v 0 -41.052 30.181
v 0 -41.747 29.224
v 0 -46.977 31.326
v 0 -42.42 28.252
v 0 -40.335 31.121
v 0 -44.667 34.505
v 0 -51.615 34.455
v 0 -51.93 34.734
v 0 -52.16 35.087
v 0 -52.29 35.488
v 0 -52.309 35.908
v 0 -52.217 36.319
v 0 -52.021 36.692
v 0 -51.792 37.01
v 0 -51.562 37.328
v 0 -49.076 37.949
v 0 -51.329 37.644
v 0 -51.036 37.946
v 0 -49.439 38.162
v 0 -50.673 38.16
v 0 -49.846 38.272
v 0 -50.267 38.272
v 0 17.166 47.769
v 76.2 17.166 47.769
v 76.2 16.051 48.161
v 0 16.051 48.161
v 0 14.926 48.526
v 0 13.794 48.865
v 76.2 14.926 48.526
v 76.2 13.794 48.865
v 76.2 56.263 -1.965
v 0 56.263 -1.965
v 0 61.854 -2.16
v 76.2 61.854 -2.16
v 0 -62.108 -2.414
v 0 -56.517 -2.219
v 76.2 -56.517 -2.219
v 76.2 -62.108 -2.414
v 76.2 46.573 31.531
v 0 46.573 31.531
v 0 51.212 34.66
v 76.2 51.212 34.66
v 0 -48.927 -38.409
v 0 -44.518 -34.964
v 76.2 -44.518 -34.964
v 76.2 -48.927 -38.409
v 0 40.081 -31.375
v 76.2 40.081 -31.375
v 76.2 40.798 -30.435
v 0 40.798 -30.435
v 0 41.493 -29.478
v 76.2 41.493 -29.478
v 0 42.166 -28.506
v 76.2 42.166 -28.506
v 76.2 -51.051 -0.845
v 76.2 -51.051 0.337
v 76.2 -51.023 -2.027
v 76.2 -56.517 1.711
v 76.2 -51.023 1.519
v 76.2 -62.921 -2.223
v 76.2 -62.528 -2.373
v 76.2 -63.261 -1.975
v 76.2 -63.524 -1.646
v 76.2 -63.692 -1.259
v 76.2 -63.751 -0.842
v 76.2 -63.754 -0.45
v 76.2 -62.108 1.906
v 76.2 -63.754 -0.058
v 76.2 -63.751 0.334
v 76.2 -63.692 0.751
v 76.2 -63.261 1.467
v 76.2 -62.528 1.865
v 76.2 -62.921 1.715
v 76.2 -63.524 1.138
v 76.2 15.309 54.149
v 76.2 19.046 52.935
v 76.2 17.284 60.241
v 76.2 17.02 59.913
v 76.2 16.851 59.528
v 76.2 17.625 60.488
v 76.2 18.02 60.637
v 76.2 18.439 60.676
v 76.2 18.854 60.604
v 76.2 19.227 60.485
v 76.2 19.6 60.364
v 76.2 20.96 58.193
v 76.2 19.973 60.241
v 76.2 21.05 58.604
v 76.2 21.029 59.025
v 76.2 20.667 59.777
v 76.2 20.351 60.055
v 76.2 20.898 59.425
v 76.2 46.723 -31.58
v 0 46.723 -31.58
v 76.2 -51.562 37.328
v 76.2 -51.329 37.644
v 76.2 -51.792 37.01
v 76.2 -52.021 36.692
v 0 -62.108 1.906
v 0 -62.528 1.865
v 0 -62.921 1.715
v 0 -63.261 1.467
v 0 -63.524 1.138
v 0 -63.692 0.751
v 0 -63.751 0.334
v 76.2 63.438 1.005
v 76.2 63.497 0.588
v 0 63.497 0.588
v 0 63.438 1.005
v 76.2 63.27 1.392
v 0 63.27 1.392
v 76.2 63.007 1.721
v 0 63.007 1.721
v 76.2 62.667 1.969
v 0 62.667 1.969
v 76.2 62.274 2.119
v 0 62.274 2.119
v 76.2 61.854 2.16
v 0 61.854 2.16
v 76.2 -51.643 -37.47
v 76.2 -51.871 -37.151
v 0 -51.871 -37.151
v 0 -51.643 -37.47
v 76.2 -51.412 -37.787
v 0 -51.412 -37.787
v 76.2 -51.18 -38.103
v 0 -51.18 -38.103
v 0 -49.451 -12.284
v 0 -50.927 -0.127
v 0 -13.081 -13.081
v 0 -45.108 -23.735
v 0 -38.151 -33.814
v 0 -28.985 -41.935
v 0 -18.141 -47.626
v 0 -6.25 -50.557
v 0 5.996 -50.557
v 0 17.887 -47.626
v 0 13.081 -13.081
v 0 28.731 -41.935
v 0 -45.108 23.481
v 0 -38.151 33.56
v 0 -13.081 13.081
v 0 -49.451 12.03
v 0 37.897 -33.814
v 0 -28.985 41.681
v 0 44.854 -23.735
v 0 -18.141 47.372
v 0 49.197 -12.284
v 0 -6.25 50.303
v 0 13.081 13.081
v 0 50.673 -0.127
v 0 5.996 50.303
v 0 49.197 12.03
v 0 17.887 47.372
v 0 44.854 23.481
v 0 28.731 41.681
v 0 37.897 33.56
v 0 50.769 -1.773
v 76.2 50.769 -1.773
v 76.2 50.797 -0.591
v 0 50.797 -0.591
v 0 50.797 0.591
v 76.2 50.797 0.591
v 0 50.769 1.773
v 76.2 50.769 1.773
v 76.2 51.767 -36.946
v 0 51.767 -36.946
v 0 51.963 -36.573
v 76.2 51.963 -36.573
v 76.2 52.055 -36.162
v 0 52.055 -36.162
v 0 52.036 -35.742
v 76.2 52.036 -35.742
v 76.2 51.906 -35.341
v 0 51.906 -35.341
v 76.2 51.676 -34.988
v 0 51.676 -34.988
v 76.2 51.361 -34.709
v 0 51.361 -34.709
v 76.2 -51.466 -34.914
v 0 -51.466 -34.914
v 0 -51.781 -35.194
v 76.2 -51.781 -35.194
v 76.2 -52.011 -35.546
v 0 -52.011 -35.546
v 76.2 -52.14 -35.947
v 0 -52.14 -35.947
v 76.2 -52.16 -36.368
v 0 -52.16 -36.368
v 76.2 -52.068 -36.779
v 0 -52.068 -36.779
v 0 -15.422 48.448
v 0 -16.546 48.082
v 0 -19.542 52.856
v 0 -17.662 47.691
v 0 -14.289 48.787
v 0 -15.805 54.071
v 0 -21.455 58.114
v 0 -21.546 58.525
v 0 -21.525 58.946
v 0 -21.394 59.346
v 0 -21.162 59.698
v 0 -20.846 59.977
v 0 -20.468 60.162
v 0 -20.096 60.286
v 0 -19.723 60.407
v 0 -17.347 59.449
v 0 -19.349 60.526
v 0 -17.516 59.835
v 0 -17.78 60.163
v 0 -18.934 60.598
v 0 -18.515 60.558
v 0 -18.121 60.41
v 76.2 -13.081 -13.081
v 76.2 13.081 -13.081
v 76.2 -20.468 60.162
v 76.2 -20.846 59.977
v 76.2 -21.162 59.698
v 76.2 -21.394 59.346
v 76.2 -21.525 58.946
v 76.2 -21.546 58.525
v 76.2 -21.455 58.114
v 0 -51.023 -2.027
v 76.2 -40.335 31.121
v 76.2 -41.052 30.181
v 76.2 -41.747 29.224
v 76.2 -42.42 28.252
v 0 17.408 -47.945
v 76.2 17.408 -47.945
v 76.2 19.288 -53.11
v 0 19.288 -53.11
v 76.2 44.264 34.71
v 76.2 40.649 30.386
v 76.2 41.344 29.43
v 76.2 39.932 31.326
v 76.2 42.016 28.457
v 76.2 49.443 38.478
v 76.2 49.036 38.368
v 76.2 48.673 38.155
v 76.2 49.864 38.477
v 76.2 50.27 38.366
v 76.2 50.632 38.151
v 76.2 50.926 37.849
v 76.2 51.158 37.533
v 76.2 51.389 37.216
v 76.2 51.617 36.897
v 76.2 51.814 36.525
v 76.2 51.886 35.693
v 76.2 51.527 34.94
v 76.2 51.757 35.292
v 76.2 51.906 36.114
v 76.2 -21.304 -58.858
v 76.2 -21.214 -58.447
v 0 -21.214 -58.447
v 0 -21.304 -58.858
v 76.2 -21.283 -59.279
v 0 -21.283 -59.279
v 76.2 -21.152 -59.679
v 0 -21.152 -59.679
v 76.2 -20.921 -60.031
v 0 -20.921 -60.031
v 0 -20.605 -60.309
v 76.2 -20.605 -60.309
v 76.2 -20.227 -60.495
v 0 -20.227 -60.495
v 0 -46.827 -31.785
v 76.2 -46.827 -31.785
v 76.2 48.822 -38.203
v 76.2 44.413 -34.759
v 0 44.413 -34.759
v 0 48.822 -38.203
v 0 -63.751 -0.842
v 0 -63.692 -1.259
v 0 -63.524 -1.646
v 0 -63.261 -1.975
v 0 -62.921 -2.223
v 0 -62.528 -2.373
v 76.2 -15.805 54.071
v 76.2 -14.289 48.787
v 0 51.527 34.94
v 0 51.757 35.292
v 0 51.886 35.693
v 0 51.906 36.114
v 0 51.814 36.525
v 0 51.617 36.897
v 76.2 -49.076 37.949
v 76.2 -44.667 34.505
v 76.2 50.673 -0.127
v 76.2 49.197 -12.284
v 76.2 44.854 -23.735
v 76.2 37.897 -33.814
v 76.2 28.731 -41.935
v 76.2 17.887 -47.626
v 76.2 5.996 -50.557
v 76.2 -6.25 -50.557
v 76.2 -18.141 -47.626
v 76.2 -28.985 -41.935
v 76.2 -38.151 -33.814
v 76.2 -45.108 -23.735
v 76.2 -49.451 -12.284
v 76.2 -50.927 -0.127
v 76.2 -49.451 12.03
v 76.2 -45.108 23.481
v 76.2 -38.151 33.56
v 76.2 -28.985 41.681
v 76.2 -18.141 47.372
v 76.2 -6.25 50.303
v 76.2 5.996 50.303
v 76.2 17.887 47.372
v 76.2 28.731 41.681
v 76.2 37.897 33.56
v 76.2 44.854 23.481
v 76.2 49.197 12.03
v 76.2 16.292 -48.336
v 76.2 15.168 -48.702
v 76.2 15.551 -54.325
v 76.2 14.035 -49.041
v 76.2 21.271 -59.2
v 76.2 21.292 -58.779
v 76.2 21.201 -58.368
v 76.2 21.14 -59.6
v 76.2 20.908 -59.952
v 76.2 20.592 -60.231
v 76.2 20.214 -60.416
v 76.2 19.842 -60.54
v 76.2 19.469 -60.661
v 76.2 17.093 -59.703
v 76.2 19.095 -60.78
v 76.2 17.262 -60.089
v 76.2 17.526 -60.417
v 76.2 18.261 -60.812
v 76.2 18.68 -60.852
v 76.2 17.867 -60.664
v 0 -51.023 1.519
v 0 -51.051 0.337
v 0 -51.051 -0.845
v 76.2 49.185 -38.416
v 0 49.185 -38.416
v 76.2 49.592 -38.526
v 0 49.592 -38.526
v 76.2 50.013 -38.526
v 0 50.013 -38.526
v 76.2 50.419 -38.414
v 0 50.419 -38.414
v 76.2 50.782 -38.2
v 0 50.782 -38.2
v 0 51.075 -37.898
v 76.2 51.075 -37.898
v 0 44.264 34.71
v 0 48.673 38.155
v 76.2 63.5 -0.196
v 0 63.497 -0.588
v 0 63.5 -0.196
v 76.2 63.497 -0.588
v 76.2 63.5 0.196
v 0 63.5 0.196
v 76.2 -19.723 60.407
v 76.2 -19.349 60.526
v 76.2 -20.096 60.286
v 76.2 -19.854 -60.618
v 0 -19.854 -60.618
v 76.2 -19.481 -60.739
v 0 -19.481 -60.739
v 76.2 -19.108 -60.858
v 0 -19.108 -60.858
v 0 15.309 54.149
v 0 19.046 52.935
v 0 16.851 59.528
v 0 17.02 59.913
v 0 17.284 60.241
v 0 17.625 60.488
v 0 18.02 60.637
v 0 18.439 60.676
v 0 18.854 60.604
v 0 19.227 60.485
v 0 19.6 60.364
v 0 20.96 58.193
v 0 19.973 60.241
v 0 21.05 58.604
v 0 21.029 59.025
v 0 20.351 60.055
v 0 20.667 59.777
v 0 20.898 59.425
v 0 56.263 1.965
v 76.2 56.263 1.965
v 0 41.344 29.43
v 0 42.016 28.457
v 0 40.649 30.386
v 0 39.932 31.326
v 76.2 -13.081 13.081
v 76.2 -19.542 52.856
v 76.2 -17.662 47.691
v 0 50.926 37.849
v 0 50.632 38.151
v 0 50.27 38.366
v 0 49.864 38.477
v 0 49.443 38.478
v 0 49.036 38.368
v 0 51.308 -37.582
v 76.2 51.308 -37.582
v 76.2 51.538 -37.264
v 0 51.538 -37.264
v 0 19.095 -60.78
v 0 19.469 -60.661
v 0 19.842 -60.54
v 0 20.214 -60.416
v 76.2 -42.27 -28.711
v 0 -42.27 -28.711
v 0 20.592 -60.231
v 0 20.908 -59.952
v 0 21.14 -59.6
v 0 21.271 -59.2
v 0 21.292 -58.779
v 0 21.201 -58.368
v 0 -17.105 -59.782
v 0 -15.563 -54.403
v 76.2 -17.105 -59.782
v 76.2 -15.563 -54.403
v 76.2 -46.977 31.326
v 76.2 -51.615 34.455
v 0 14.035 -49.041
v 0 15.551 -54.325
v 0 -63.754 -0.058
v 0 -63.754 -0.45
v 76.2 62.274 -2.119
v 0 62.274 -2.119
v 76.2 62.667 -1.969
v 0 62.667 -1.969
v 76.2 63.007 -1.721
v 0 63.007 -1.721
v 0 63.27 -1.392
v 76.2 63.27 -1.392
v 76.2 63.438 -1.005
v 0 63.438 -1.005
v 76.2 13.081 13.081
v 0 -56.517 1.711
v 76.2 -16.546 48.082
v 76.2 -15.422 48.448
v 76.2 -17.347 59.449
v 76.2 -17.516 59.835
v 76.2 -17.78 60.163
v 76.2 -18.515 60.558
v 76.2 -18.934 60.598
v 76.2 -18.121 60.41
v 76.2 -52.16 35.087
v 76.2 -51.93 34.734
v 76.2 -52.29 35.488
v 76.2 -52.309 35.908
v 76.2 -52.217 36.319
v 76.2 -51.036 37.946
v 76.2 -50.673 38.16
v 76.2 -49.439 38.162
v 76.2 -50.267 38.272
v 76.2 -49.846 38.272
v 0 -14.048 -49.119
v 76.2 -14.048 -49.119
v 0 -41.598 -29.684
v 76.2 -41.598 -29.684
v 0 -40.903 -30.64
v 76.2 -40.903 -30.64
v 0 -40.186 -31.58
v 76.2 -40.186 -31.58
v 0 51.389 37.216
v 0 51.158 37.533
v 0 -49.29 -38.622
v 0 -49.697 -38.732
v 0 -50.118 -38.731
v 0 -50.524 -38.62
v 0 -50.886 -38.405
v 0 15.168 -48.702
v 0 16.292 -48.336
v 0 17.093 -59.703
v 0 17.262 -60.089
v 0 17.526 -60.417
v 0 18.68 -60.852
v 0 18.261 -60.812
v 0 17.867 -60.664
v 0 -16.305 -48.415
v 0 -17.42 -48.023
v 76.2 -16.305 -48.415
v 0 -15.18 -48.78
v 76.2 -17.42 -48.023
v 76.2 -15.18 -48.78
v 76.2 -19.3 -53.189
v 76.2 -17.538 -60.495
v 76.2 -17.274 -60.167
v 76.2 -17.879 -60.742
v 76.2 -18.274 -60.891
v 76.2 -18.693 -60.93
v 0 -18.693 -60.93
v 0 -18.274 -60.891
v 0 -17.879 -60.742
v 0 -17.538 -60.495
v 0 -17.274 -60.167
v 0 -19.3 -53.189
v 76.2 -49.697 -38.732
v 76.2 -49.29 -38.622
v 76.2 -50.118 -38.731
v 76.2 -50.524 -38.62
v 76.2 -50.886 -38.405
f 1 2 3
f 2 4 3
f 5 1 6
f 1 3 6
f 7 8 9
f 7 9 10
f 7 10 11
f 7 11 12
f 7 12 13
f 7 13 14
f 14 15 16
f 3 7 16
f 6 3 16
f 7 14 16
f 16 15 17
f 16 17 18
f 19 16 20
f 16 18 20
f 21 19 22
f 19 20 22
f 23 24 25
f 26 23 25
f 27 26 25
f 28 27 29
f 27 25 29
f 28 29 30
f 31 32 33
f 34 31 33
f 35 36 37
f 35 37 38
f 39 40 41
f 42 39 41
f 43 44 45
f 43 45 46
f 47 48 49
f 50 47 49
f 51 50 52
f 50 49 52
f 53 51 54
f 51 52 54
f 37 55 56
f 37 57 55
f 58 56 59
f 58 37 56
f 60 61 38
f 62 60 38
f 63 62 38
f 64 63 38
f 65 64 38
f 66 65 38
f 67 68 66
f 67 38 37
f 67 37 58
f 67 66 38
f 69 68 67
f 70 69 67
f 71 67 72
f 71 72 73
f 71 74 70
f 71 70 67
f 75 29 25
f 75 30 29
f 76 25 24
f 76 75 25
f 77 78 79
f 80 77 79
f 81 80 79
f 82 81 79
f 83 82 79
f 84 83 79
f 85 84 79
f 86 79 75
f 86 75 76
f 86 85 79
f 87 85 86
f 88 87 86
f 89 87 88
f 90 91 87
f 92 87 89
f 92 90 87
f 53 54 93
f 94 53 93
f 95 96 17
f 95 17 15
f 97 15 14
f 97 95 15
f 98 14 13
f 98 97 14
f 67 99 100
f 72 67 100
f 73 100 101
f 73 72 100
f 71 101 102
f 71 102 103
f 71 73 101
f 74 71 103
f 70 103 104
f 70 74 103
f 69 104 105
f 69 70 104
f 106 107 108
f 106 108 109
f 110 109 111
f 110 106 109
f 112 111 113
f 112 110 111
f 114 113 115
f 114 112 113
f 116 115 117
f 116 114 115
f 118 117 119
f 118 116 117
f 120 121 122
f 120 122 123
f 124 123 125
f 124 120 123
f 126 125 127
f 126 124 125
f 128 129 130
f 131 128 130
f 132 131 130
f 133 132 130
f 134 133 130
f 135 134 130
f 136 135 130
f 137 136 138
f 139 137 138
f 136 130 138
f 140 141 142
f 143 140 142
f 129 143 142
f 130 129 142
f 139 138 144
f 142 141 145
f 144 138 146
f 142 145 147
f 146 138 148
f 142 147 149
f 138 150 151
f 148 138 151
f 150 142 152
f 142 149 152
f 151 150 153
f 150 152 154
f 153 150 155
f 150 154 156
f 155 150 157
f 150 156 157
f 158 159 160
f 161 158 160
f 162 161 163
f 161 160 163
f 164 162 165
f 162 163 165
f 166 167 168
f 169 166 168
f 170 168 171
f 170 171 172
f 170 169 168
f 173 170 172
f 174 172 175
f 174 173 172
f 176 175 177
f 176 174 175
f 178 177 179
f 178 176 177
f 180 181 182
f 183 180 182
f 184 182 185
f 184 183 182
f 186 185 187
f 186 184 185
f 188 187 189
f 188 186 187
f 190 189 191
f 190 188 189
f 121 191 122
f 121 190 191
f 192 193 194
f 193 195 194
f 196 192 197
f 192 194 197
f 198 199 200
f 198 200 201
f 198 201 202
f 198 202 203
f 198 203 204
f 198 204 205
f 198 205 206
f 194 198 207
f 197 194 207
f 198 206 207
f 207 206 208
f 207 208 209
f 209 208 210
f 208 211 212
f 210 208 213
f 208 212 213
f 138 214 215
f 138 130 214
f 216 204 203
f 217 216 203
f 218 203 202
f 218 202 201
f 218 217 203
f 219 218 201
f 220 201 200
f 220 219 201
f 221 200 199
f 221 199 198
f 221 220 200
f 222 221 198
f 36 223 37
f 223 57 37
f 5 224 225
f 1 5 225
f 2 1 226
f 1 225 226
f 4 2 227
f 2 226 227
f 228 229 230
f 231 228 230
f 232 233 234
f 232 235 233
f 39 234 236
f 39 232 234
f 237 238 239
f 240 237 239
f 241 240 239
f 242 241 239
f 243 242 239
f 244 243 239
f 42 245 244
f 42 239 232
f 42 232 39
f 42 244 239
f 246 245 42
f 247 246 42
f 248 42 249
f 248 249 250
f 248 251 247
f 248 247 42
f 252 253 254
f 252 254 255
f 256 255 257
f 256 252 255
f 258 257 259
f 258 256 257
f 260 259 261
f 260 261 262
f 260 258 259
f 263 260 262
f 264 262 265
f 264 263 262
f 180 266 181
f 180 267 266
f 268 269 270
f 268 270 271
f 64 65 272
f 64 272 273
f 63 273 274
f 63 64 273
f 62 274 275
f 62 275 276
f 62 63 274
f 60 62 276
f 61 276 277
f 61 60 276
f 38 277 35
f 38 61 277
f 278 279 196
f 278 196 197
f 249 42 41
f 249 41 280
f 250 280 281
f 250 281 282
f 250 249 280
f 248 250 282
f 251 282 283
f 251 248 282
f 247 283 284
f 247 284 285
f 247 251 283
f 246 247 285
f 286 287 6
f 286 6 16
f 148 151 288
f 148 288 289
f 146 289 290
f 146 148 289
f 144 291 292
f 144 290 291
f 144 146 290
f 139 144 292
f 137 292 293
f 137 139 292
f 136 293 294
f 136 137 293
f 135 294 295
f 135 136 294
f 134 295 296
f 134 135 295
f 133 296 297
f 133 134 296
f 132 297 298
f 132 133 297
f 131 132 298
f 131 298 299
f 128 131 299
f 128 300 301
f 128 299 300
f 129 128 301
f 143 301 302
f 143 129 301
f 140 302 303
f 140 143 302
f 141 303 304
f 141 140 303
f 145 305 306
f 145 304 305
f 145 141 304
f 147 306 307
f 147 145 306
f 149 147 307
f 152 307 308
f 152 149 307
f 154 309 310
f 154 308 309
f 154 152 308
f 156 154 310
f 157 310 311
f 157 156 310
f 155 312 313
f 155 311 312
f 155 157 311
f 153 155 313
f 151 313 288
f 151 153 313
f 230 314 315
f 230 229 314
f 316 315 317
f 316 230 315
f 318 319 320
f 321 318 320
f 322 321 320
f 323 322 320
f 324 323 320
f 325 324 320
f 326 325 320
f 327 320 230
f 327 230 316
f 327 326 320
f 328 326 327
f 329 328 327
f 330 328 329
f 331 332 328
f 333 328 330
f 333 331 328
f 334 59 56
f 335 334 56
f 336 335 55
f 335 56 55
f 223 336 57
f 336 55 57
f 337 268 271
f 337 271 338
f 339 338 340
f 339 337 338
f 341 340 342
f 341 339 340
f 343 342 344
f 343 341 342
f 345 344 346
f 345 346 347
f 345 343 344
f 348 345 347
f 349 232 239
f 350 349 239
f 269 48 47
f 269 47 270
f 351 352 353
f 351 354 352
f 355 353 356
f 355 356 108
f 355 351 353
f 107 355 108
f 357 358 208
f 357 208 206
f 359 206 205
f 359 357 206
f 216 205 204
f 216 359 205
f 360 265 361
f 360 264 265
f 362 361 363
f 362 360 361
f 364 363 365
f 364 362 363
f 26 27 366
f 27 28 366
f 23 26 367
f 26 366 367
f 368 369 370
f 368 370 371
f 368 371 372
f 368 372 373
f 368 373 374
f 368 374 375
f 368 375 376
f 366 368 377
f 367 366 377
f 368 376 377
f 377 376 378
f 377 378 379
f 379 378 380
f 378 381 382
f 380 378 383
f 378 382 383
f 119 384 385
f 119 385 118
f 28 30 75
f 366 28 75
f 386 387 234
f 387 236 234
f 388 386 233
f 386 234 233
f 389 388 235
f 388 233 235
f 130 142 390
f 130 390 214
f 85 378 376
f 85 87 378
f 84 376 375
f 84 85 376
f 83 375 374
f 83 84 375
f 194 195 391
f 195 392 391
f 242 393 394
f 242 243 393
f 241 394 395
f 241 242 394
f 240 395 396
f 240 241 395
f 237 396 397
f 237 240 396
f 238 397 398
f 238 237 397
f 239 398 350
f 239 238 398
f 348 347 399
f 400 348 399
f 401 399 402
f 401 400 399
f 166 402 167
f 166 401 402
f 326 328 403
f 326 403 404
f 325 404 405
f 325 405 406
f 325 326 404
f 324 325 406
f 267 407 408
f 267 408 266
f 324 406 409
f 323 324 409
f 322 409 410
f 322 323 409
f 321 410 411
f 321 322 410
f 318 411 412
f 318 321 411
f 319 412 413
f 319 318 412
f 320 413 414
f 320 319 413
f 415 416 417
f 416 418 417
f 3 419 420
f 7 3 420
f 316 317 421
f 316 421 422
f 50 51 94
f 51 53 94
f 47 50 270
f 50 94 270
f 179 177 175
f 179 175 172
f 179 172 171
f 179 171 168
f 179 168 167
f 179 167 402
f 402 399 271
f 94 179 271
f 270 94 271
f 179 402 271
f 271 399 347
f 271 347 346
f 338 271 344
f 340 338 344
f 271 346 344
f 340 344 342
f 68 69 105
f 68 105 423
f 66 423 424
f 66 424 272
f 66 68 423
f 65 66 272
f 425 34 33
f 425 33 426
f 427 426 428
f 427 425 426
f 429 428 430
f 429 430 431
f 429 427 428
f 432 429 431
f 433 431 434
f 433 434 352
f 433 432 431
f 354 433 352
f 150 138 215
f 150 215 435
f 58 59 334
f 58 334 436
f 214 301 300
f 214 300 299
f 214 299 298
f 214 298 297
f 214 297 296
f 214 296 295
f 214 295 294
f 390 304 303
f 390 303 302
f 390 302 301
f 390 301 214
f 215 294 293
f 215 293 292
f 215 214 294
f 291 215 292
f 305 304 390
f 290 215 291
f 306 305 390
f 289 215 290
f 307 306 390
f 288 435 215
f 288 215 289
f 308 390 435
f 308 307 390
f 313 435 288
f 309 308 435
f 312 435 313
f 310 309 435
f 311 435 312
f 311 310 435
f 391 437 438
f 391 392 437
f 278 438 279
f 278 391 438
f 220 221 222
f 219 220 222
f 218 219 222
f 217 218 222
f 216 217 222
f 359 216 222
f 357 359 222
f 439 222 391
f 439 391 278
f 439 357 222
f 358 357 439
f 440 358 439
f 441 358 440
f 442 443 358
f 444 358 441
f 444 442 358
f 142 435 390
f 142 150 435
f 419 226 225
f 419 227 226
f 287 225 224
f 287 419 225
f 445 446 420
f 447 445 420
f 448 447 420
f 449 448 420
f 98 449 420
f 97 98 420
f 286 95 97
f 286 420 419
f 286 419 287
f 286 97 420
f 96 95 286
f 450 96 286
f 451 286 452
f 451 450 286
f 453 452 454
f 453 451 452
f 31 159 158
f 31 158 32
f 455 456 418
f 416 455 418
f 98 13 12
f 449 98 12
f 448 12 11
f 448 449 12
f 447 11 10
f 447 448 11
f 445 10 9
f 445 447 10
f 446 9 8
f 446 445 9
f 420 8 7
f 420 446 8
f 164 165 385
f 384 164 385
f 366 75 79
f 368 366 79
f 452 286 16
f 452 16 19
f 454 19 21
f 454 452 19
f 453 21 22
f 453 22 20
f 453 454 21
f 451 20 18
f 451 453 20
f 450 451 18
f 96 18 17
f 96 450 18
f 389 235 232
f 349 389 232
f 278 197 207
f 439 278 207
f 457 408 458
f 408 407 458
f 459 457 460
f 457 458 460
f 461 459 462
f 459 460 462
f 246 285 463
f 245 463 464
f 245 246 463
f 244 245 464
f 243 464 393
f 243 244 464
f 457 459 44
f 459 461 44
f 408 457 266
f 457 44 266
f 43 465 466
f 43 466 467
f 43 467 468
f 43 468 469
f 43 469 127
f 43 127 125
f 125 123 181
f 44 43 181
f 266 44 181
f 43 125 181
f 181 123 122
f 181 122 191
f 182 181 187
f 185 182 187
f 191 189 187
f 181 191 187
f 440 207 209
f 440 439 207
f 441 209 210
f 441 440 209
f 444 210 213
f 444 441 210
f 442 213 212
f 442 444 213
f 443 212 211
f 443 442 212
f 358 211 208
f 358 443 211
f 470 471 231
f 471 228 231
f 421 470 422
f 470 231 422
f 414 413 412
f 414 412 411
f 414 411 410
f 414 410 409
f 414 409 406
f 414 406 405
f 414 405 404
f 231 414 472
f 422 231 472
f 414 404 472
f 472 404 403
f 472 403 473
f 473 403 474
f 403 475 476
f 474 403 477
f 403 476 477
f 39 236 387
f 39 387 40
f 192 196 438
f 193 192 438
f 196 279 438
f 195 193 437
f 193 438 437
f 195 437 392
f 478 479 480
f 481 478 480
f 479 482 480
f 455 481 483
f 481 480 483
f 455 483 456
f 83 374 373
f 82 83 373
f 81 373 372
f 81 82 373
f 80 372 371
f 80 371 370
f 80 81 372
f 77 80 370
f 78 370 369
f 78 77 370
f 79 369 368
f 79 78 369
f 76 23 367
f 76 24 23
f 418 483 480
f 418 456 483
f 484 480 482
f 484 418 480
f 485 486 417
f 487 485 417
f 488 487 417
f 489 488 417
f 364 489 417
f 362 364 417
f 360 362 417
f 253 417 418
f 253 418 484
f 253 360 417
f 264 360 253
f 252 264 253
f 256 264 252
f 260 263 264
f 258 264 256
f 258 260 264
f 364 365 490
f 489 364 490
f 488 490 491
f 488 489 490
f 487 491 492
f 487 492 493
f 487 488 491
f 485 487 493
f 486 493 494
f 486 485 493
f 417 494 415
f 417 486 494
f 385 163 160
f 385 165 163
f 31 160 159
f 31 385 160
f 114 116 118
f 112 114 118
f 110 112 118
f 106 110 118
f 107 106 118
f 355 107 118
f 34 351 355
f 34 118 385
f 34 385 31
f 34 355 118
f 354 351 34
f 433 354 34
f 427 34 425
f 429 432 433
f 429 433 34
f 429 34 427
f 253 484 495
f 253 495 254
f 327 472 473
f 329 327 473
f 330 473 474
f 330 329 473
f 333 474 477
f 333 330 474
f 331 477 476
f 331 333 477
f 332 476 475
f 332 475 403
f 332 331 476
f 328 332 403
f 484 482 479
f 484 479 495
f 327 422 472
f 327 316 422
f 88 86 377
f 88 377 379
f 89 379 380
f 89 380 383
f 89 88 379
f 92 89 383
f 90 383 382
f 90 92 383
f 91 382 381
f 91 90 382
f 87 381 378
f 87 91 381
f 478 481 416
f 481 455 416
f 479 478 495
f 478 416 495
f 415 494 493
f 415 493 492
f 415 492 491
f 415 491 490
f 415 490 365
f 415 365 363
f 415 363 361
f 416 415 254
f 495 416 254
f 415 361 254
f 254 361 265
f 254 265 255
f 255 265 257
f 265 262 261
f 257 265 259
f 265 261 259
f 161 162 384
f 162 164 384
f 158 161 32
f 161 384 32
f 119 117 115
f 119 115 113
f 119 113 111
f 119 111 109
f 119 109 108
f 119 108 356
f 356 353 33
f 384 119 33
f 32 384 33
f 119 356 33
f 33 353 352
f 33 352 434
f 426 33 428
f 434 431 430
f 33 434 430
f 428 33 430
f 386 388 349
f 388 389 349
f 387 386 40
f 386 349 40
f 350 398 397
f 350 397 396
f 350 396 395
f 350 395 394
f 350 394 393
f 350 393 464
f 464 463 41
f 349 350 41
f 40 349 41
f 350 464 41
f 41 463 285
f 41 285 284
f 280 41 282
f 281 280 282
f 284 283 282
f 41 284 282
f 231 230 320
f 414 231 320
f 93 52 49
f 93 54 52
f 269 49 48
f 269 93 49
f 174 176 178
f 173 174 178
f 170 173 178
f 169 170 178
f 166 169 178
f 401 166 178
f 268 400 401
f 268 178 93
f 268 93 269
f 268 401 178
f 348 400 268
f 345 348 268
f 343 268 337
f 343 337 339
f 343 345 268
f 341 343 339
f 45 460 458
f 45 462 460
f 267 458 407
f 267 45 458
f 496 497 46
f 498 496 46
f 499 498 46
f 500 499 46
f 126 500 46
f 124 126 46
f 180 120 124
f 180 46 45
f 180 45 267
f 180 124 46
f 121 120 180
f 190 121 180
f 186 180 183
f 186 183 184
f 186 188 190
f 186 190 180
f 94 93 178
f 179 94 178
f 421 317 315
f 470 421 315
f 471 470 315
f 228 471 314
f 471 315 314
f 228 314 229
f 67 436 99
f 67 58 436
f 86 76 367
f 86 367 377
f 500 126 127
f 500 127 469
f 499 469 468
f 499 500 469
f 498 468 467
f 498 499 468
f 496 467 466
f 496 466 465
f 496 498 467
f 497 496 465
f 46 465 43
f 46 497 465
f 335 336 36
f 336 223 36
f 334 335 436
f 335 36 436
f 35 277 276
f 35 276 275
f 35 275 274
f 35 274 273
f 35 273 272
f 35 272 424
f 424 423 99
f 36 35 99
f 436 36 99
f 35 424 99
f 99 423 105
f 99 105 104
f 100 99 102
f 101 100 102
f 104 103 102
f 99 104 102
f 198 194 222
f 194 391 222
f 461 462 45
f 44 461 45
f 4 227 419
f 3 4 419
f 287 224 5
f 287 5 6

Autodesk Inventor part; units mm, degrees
ref_plane "YZ Plane" through (0, 0, 0) normal (1, 0, 0) x (0, 1, 0)
ref_plane "XZ Plane" through (0, 0, 0) normal (0, 1, 0) x (-1, 0, 0)
ref_plane "XY Plane" through (0, 0, 0) normal (0, 0, 1) x (1, 0, 0)
sketch "Sketch1" plane through (0, 0, 0) normal (1, 0, 0) x (0, 1, 0)
  circle A0 centre (-0.127, -0.127) radius 50.8
  line L0 (13.081, 13.081) -> (-13.081, 13.081)
  line L1 (-13.081, 13.081) -> (-13.081, -13.081)
  line L2 (-13.081, -13.081) -> (13.081, -13.081)
  line L3 (13.081, -13.081) -> (13.081, 13.081)
  dimension "d58" = 26.162
  dimension "d59" = 26.162
extrude "Extrusion1" add sketch "Sketch1" along normal blind 76.2
sketch "Sketch4" plane through (76.2, 0, 0) normal (1, 0, 0) x (0, 0, -1)
  line L0 (0, 0) -> (62.0637, 0) construction
  line L1 (0, 0) -> (66.7156, 0) construction
  line L2 (0, 0) -> (71.481, 0) construction
  line L3 (0, 0) -> (54.0079, 0) construction
  line L4 (0, 0) -> (54.0079, 0) construction
  line L5 (1.7729, 50.7691) -> (1.9647, 56.2627)
  line L6 (0, 0) -> (63.5387, 0) construction
  line L7 (-1.7729, 50.7691) -> (-1.9647, 56.2627)
  line L8 (0, 0) -> (61.9502, 0) construction
  arc A0 (0.5882, 63.4973) -> (-0.5882, 63.4973) centre (0, 0) ccw
  line L9 (1.7729, 50.7691) -> (2.16, 61.8544)
  line L10 (-1.7729, 50.7691) -> (-2.16, 61.8544)
  arc A1 (-0.5882, 63.4973) -> (-2.16, 61.8544) centre (-0.5735, 61.9098) ccw
  arc A2 (2.16, 61.8544) -> (0.5882, 63.4973) centre (0.5735, 61.9098) ccw
  circle A3 centre (0, 0) radius 50.8
  point P0 (1.9945, 57.1152)
  point P1 (-1.9945, 57.1152)
  point P2 (2.2161, 63.4613)
  point P3 (-2.2161, 63.4613)
  dimension "d52" = 127
  dimension "d53" = 1.5875
extrude "Extrusion4" add sketch "Sketch4" against normal blind 76.2 contours A3 L7 L10 A1 A0 A2 L9 L5
pattern_circular "Circular Pattern2" count 10 over 360 about axis through (0, -0.127, -0.127) along (1, 0, 0) of "Extrusion4"
sketch "Sketch5" plane through (76.2, -0.127, -0.127) normal (1, 0, 0) x (0, 0, -1)
  point P0 (-0.127, 0.127)
properties part number "220411 Large Rod Laddered"
